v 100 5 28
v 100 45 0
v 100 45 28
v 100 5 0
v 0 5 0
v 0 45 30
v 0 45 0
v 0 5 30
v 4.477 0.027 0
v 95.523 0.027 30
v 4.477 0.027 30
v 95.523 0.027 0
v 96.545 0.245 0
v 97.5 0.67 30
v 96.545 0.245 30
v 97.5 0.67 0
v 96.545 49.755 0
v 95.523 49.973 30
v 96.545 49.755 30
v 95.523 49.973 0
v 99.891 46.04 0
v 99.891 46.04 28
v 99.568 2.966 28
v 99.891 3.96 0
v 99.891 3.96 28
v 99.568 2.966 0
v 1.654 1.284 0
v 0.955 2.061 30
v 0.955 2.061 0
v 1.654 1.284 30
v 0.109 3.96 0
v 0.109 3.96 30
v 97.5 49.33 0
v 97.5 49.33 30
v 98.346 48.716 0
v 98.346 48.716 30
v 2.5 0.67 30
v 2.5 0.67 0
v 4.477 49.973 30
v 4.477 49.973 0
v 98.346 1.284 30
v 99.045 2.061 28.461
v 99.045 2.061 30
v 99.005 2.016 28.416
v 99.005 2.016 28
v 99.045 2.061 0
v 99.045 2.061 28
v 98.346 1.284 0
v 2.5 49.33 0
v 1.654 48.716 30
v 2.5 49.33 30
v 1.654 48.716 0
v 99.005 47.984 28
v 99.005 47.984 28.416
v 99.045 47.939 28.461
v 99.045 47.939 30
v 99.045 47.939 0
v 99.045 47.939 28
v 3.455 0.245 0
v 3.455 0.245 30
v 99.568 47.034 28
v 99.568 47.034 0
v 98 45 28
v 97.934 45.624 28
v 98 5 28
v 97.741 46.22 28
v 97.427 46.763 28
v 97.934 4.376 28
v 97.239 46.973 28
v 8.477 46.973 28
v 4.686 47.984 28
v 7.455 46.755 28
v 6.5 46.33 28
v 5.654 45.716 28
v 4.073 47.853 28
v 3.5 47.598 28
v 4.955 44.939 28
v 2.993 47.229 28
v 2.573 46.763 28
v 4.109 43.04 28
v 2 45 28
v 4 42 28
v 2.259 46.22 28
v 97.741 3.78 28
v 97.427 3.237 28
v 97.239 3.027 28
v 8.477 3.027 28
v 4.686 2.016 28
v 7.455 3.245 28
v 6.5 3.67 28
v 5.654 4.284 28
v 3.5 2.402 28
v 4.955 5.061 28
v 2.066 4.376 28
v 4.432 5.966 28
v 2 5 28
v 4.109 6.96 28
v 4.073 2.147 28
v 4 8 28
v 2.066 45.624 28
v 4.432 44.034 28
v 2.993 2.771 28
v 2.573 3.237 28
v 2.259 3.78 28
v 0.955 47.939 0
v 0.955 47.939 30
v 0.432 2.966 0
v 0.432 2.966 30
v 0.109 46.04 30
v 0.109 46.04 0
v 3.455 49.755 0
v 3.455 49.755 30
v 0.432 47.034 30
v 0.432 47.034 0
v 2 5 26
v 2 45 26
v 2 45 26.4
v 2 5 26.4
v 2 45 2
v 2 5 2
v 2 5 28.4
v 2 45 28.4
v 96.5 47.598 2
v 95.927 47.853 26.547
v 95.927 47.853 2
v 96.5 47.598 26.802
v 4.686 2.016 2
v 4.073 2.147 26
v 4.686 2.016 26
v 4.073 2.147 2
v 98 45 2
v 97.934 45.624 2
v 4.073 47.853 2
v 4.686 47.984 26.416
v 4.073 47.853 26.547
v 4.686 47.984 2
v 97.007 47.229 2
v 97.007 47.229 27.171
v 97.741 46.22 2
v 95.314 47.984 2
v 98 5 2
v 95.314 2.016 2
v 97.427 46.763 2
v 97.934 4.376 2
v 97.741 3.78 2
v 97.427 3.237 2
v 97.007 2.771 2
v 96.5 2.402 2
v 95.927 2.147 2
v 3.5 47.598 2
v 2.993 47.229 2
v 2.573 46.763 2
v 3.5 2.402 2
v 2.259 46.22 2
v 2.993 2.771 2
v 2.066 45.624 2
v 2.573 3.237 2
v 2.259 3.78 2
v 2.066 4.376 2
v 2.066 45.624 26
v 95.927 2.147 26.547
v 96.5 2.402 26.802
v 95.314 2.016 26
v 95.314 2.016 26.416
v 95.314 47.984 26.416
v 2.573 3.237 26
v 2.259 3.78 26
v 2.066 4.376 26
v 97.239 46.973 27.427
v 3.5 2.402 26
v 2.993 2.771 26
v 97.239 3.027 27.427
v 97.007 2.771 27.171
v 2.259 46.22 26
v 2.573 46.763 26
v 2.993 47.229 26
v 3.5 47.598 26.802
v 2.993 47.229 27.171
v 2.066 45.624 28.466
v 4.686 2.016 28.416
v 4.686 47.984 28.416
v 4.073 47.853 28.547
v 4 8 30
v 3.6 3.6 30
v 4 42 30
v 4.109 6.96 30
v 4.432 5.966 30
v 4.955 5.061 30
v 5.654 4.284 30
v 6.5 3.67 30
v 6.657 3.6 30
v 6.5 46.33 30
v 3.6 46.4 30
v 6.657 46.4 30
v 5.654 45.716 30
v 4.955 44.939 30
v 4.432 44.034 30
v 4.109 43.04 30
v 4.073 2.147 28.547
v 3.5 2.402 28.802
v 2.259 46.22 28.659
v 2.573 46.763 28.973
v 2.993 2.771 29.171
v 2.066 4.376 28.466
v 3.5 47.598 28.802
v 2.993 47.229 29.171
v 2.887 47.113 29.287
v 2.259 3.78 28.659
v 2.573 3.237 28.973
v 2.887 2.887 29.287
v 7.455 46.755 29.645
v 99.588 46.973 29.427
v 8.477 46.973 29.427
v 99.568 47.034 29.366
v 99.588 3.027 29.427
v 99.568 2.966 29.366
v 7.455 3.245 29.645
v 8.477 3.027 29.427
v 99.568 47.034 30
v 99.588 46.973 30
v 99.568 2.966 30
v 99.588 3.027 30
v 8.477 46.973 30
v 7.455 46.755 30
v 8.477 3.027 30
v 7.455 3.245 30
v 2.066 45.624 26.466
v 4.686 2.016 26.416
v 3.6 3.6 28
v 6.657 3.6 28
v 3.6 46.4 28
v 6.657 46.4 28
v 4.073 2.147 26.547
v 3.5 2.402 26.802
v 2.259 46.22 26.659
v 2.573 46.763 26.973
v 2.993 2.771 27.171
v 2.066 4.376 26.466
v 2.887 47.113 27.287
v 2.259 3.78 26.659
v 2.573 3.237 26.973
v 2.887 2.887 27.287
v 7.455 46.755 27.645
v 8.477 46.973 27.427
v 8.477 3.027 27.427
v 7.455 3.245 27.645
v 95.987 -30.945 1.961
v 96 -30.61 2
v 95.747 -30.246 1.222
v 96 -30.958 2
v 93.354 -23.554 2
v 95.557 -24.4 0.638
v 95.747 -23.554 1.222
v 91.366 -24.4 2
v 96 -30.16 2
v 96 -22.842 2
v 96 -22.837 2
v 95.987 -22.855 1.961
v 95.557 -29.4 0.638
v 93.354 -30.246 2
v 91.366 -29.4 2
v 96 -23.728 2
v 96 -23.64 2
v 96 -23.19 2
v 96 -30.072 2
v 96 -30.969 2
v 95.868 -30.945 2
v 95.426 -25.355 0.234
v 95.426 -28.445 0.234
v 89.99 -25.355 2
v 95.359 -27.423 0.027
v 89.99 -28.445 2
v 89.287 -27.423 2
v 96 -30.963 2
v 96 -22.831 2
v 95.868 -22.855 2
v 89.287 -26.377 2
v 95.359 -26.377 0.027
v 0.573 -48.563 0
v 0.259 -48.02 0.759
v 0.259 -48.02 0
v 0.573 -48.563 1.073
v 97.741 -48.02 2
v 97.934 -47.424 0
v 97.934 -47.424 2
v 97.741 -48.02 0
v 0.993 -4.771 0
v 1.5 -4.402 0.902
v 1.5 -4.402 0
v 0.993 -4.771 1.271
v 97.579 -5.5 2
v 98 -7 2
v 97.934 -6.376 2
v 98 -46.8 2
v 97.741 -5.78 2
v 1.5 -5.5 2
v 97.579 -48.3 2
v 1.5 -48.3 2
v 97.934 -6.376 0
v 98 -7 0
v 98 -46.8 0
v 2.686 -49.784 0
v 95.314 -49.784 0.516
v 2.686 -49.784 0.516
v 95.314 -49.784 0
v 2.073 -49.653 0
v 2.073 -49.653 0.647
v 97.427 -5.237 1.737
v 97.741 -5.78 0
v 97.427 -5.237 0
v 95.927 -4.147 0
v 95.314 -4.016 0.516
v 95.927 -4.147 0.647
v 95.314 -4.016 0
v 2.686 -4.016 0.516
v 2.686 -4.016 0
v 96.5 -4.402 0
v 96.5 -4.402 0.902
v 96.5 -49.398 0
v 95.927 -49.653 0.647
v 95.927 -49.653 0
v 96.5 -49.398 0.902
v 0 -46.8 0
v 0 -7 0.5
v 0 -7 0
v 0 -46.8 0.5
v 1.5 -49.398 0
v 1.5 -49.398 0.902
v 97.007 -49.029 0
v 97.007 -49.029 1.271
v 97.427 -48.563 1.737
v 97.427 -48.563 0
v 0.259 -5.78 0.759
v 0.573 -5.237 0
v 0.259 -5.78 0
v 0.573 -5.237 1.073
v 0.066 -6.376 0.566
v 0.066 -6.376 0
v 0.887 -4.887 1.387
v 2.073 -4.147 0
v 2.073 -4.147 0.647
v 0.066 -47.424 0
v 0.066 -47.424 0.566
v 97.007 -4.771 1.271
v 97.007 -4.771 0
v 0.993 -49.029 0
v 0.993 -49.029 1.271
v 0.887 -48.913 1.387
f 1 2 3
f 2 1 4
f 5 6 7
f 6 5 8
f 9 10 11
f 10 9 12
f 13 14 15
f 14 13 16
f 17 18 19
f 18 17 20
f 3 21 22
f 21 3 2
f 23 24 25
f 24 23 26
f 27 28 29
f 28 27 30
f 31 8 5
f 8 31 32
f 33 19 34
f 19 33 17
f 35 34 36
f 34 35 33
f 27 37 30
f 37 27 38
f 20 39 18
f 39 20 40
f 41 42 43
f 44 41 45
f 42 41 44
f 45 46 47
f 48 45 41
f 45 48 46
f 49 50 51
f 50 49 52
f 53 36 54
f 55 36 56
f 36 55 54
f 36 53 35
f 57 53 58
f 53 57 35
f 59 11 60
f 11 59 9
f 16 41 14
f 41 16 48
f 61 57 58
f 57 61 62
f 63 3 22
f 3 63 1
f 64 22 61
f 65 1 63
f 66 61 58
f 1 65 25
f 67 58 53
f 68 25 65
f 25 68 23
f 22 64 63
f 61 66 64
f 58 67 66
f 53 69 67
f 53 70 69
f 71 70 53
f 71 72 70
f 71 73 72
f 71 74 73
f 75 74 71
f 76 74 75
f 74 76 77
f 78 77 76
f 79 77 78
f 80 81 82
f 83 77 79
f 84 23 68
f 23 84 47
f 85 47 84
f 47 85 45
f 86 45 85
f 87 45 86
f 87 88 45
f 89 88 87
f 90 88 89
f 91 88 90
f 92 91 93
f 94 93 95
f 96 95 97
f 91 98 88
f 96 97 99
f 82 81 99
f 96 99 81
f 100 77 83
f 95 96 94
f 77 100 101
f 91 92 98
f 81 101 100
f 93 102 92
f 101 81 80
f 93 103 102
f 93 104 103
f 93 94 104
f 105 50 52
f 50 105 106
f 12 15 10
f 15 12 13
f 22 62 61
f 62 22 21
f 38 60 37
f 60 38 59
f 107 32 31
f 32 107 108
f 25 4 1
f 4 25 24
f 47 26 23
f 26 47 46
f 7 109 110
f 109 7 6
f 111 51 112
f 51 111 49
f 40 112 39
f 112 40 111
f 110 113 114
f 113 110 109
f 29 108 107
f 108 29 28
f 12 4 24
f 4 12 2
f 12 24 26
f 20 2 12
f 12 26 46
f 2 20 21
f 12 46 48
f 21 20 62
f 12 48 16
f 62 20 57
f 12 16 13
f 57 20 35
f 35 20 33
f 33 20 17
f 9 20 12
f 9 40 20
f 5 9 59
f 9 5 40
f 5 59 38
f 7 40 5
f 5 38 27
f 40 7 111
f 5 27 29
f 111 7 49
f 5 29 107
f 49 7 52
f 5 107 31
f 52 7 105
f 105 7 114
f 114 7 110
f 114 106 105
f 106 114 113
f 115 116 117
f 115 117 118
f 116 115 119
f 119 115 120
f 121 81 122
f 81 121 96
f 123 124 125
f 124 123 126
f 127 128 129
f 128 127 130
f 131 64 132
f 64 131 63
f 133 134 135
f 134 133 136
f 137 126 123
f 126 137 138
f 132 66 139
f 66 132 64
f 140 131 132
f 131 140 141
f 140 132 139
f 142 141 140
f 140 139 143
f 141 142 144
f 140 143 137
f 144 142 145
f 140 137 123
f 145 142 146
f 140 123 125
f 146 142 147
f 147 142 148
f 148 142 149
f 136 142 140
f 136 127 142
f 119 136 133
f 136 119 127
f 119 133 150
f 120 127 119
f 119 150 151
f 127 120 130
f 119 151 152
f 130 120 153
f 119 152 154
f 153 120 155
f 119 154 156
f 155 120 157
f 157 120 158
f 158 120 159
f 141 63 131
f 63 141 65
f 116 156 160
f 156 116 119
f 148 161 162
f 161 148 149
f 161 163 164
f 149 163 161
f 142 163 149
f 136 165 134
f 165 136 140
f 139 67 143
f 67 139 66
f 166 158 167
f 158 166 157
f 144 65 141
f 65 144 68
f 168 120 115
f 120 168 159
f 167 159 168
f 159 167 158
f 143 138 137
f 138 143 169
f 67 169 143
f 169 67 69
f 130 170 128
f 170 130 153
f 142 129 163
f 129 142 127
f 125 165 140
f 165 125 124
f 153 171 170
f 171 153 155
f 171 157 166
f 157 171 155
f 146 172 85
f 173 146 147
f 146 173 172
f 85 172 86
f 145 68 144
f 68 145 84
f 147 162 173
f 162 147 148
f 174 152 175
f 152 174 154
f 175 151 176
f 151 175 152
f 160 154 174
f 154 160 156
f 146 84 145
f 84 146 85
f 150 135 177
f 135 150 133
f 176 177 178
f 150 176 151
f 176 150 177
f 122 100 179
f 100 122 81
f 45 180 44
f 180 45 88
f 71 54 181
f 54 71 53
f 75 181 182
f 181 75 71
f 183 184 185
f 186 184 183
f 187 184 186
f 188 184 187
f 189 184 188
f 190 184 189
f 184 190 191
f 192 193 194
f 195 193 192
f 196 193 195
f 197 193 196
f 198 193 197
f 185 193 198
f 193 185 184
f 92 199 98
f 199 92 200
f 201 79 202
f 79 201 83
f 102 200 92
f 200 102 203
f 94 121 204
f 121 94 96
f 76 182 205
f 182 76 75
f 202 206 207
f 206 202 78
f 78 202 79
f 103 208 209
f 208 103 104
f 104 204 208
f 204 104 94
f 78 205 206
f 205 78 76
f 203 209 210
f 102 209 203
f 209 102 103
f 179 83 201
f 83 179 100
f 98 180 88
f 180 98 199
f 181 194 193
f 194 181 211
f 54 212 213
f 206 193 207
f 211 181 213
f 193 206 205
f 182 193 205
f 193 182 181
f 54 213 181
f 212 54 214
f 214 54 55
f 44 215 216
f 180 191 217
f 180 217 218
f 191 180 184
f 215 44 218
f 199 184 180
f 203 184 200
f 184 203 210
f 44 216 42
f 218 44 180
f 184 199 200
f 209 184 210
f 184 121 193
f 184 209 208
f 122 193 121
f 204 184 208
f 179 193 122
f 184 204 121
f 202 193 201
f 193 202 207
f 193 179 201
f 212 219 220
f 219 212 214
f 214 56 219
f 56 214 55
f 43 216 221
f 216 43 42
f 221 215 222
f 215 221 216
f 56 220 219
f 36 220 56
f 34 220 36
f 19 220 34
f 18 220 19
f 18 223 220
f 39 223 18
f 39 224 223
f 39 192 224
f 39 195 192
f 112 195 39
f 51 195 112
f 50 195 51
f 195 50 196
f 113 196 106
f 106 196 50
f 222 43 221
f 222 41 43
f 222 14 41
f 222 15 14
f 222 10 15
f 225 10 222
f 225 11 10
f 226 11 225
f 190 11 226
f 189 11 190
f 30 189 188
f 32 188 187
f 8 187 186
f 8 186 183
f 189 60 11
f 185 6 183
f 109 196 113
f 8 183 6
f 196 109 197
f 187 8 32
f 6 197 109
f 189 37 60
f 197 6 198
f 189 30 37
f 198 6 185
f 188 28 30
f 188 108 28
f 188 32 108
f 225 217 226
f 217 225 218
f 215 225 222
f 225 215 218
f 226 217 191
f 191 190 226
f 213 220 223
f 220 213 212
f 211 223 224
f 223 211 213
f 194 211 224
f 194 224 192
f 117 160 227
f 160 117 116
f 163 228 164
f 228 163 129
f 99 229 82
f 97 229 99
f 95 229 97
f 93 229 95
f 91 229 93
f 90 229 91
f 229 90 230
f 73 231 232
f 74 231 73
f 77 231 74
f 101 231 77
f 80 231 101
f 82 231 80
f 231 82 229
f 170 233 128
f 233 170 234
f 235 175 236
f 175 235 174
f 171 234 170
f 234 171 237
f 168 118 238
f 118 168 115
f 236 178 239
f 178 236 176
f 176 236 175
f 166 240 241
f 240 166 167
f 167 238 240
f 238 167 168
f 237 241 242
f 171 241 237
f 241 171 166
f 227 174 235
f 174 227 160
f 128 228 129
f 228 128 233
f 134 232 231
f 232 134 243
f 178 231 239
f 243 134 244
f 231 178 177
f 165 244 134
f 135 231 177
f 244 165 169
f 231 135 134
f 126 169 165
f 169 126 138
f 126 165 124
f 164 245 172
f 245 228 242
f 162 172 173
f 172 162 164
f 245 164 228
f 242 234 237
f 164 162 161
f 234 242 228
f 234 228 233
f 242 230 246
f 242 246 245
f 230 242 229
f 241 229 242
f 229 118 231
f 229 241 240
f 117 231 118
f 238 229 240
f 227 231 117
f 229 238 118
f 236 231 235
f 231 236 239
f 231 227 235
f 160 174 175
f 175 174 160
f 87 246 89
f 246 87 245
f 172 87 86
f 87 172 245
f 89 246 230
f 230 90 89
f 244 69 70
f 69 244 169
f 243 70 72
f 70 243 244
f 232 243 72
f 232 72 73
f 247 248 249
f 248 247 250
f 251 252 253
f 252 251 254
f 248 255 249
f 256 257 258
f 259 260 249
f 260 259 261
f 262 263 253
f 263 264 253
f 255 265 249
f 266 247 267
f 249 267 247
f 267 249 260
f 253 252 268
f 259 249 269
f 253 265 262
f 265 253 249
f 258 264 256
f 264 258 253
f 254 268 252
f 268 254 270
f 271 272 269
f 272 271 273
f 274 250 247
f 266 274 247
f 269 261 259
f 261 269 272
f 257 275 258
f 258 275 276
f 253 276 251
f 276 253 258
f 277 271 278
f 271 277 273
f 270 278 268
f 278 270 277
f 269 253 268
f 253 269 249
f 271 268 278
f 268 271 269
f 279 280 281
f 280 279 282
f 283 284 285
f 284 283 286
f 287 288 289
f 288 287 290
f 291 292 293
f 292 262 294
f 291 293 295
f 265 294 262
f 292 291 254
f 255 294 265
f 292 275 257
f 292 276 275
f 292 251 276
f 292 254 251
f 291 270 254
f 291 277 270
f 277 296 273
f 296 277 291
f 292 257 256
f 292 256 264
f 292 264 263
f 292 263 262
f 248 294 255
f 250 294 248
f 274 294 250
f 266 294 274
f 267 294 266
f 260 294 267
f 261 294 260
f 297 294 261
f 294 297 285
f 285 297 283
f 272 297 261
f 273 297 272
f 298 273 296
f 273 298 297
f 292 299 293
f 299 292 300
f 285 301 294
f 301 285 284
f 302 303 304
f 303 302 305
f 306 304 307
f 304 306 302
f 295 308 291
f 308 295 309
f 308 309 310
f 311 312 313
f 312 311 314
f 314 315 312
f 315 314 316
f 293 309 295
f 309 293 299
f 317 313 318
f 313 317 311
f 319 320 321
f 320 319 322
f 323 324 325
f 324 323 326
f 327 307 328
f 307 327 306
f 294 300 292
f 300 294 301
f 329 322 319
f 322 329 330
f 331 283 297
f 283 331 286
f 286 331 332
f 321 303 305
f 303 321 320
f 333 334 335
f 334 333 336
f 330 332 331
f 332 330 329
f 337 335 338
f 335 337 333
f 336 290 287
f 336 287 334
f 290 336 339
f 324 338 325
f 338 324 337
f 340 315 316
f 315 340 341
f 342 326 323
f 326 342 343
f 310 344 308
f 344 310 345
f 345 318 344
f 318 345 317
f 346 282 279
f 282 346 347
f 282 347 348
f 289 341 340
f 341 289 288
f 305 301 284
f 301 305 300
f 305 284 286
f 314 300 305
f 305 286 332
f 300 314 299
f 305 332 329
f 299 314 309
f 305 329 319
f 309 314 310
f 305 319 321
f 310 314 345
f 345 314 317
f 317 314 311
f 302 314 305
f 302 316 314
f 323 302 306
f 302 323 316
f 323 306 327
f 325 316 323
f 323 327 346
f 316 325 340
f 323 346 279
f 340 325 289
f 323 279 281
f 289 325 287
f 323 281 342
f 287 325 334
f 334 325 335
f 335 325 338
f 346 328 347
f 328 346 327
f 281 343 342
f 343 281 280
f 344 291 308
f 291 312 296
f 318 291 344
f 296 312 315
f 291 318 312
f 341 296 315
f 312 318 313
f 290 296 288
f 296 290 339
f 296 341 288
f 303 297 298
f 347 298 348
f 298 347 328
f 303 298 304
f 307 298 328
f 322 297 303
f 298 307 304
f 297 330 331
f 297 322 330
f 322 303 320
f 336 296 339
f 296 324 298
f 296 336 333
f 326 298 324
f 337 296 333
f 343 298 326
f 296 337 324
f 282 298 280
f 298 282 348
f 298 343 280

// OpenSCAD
itemsShown="both"; // [both,box,lid]
boxLength=100;
boxWidth=50;
boxHeight=30;
cornerRadius=5;
wallThickness=2;
bottomThickness=2;
lidThickness=2;
lidClearance=0.2;
lidEdgeThickness=0.5;
// Notch in the lid
withNotch=true;//true;//[true:false]

/* [Global] */
if (itemsShown=="box") showBox();
if (itemsShown=="lid") showLid();
if (itemsShown=="both"){showBox();showLid();}

module showLid(){
	translate ([0, -2*wallThickness, 0]) 
	roundBoxLid(l=boxLength-wallThickness,
				w=boxWidth-2*wallThickness-lidClearance,
				h=lidThickness,
				et=lidEdgeThickness,
				r=cornerRadius-wallThickness,
				notch=withNotch);
}

module showBox(){
	round_box(l=boxLength,
			  w=boxWidth,
			  h=boxHeight,
			  bt=bottomThickness,
			  wt=wallThickness,
			  lt=lidThickness,
			  r=cornerRadius);
}

module round_box(l=40,w=30,h=30,bt=2,wt=2,lt=2,r=5,){
	difference() { 
		round_cube(l=l,w=w,h=h-lt,r=r);
		translate ([wt, wt, bt]) 
		round_cube(l=l-wt*2,w=w-wt*2,h=h,r=r-wt);
	}
	//use two box rims. one to make a slope to support the lid
	roundBoxRim();
	translate ([0, 0, -wt]) roundBoxRim();
}

module roundBoxRim(l=boxLength,
				   w=boxWidth,
				   h=boxHeight,
				   et=lidEdgeThickness,
				   r=cornerRadius,
				   wt=wallThickness,
				   lt=lidThickness){
	difference() { 
		translate ([0, 0, h-lt]) 
		round_cube(l=l,w=w,h=lt,r=r);
		translate ([wt+lt,wt+lt-et*2,h-lt-0.1]) 
		round_cube(l=l*2,w=w-2*(wt+lt)+4*et,h=lt+0.2,r=r-wt+lt);

		//subtract out a lid to make the ledge
		translate ([wt, w-wt, h-lt-0.1])
		roundBoxLid(l=l*2,w=w-2*wt,h=lt+0.1,wt=wt,t=lt,et=0.5,r=r-wt,notch=false);
	}
}

module roundBoxLid(l=40,w=30,h=3,wt=2,t=2,et=0.5,r=5,notch=true){
	translate ([l, 0, 0]) 
	rotate (a = [0, 0, 180]) 
	difference(){
		round_cube(l=l,w=w,h=h,t=t,r=r);

		translate ([-1, 0, et]) rotate (a = [45, 0, 0])  cube (size = [l+2, h*2, h*2]); 
		translate ([-1, w, et]) rotate (a = [45, 0, 0])  cube (size = [l+2, h*2, h*2]); 
		translate ([l, -1, et]) rotate (a = [45, 0, 90]) cube (size = [w+2, h*2, h*2]); 
		if (notch==true){
			translate([2,w/2,h+0.001]) thumbNotch(10/2,72,t);
		}
	}
}

module thumbNotch(
	thumbR=12/2,
	angle=72,
	notchHeight=2){

	size=10*thumbR;

	rotate([0,0,90])
	difference(){
		translate([0,
					(thumbR*sin(angle)-notchHeight)/tan(angle),
					 thumbR*sin(angle)-notchHeight])
		rotate([angle,0,0])
		cylinder(r=thumbR,h=size,$fn=30);

		translate([-size,-size,0])
		cube(size*2);
	}
}

module round_cube(l=40,w=30,h=20,r=5,$fn=30){
	hull(){ 
		translate ([r, r, 0]) cylinder (h = h, r=r);
		translate ([r, w-r, 0]) cylinder (h = h, r=r);
		translate ([l-r,w-r, 0]) cylinder (h = h, r=r);
		translate ([l-r, r, 0]) cylinder (h = h, r=r);
	}
}
